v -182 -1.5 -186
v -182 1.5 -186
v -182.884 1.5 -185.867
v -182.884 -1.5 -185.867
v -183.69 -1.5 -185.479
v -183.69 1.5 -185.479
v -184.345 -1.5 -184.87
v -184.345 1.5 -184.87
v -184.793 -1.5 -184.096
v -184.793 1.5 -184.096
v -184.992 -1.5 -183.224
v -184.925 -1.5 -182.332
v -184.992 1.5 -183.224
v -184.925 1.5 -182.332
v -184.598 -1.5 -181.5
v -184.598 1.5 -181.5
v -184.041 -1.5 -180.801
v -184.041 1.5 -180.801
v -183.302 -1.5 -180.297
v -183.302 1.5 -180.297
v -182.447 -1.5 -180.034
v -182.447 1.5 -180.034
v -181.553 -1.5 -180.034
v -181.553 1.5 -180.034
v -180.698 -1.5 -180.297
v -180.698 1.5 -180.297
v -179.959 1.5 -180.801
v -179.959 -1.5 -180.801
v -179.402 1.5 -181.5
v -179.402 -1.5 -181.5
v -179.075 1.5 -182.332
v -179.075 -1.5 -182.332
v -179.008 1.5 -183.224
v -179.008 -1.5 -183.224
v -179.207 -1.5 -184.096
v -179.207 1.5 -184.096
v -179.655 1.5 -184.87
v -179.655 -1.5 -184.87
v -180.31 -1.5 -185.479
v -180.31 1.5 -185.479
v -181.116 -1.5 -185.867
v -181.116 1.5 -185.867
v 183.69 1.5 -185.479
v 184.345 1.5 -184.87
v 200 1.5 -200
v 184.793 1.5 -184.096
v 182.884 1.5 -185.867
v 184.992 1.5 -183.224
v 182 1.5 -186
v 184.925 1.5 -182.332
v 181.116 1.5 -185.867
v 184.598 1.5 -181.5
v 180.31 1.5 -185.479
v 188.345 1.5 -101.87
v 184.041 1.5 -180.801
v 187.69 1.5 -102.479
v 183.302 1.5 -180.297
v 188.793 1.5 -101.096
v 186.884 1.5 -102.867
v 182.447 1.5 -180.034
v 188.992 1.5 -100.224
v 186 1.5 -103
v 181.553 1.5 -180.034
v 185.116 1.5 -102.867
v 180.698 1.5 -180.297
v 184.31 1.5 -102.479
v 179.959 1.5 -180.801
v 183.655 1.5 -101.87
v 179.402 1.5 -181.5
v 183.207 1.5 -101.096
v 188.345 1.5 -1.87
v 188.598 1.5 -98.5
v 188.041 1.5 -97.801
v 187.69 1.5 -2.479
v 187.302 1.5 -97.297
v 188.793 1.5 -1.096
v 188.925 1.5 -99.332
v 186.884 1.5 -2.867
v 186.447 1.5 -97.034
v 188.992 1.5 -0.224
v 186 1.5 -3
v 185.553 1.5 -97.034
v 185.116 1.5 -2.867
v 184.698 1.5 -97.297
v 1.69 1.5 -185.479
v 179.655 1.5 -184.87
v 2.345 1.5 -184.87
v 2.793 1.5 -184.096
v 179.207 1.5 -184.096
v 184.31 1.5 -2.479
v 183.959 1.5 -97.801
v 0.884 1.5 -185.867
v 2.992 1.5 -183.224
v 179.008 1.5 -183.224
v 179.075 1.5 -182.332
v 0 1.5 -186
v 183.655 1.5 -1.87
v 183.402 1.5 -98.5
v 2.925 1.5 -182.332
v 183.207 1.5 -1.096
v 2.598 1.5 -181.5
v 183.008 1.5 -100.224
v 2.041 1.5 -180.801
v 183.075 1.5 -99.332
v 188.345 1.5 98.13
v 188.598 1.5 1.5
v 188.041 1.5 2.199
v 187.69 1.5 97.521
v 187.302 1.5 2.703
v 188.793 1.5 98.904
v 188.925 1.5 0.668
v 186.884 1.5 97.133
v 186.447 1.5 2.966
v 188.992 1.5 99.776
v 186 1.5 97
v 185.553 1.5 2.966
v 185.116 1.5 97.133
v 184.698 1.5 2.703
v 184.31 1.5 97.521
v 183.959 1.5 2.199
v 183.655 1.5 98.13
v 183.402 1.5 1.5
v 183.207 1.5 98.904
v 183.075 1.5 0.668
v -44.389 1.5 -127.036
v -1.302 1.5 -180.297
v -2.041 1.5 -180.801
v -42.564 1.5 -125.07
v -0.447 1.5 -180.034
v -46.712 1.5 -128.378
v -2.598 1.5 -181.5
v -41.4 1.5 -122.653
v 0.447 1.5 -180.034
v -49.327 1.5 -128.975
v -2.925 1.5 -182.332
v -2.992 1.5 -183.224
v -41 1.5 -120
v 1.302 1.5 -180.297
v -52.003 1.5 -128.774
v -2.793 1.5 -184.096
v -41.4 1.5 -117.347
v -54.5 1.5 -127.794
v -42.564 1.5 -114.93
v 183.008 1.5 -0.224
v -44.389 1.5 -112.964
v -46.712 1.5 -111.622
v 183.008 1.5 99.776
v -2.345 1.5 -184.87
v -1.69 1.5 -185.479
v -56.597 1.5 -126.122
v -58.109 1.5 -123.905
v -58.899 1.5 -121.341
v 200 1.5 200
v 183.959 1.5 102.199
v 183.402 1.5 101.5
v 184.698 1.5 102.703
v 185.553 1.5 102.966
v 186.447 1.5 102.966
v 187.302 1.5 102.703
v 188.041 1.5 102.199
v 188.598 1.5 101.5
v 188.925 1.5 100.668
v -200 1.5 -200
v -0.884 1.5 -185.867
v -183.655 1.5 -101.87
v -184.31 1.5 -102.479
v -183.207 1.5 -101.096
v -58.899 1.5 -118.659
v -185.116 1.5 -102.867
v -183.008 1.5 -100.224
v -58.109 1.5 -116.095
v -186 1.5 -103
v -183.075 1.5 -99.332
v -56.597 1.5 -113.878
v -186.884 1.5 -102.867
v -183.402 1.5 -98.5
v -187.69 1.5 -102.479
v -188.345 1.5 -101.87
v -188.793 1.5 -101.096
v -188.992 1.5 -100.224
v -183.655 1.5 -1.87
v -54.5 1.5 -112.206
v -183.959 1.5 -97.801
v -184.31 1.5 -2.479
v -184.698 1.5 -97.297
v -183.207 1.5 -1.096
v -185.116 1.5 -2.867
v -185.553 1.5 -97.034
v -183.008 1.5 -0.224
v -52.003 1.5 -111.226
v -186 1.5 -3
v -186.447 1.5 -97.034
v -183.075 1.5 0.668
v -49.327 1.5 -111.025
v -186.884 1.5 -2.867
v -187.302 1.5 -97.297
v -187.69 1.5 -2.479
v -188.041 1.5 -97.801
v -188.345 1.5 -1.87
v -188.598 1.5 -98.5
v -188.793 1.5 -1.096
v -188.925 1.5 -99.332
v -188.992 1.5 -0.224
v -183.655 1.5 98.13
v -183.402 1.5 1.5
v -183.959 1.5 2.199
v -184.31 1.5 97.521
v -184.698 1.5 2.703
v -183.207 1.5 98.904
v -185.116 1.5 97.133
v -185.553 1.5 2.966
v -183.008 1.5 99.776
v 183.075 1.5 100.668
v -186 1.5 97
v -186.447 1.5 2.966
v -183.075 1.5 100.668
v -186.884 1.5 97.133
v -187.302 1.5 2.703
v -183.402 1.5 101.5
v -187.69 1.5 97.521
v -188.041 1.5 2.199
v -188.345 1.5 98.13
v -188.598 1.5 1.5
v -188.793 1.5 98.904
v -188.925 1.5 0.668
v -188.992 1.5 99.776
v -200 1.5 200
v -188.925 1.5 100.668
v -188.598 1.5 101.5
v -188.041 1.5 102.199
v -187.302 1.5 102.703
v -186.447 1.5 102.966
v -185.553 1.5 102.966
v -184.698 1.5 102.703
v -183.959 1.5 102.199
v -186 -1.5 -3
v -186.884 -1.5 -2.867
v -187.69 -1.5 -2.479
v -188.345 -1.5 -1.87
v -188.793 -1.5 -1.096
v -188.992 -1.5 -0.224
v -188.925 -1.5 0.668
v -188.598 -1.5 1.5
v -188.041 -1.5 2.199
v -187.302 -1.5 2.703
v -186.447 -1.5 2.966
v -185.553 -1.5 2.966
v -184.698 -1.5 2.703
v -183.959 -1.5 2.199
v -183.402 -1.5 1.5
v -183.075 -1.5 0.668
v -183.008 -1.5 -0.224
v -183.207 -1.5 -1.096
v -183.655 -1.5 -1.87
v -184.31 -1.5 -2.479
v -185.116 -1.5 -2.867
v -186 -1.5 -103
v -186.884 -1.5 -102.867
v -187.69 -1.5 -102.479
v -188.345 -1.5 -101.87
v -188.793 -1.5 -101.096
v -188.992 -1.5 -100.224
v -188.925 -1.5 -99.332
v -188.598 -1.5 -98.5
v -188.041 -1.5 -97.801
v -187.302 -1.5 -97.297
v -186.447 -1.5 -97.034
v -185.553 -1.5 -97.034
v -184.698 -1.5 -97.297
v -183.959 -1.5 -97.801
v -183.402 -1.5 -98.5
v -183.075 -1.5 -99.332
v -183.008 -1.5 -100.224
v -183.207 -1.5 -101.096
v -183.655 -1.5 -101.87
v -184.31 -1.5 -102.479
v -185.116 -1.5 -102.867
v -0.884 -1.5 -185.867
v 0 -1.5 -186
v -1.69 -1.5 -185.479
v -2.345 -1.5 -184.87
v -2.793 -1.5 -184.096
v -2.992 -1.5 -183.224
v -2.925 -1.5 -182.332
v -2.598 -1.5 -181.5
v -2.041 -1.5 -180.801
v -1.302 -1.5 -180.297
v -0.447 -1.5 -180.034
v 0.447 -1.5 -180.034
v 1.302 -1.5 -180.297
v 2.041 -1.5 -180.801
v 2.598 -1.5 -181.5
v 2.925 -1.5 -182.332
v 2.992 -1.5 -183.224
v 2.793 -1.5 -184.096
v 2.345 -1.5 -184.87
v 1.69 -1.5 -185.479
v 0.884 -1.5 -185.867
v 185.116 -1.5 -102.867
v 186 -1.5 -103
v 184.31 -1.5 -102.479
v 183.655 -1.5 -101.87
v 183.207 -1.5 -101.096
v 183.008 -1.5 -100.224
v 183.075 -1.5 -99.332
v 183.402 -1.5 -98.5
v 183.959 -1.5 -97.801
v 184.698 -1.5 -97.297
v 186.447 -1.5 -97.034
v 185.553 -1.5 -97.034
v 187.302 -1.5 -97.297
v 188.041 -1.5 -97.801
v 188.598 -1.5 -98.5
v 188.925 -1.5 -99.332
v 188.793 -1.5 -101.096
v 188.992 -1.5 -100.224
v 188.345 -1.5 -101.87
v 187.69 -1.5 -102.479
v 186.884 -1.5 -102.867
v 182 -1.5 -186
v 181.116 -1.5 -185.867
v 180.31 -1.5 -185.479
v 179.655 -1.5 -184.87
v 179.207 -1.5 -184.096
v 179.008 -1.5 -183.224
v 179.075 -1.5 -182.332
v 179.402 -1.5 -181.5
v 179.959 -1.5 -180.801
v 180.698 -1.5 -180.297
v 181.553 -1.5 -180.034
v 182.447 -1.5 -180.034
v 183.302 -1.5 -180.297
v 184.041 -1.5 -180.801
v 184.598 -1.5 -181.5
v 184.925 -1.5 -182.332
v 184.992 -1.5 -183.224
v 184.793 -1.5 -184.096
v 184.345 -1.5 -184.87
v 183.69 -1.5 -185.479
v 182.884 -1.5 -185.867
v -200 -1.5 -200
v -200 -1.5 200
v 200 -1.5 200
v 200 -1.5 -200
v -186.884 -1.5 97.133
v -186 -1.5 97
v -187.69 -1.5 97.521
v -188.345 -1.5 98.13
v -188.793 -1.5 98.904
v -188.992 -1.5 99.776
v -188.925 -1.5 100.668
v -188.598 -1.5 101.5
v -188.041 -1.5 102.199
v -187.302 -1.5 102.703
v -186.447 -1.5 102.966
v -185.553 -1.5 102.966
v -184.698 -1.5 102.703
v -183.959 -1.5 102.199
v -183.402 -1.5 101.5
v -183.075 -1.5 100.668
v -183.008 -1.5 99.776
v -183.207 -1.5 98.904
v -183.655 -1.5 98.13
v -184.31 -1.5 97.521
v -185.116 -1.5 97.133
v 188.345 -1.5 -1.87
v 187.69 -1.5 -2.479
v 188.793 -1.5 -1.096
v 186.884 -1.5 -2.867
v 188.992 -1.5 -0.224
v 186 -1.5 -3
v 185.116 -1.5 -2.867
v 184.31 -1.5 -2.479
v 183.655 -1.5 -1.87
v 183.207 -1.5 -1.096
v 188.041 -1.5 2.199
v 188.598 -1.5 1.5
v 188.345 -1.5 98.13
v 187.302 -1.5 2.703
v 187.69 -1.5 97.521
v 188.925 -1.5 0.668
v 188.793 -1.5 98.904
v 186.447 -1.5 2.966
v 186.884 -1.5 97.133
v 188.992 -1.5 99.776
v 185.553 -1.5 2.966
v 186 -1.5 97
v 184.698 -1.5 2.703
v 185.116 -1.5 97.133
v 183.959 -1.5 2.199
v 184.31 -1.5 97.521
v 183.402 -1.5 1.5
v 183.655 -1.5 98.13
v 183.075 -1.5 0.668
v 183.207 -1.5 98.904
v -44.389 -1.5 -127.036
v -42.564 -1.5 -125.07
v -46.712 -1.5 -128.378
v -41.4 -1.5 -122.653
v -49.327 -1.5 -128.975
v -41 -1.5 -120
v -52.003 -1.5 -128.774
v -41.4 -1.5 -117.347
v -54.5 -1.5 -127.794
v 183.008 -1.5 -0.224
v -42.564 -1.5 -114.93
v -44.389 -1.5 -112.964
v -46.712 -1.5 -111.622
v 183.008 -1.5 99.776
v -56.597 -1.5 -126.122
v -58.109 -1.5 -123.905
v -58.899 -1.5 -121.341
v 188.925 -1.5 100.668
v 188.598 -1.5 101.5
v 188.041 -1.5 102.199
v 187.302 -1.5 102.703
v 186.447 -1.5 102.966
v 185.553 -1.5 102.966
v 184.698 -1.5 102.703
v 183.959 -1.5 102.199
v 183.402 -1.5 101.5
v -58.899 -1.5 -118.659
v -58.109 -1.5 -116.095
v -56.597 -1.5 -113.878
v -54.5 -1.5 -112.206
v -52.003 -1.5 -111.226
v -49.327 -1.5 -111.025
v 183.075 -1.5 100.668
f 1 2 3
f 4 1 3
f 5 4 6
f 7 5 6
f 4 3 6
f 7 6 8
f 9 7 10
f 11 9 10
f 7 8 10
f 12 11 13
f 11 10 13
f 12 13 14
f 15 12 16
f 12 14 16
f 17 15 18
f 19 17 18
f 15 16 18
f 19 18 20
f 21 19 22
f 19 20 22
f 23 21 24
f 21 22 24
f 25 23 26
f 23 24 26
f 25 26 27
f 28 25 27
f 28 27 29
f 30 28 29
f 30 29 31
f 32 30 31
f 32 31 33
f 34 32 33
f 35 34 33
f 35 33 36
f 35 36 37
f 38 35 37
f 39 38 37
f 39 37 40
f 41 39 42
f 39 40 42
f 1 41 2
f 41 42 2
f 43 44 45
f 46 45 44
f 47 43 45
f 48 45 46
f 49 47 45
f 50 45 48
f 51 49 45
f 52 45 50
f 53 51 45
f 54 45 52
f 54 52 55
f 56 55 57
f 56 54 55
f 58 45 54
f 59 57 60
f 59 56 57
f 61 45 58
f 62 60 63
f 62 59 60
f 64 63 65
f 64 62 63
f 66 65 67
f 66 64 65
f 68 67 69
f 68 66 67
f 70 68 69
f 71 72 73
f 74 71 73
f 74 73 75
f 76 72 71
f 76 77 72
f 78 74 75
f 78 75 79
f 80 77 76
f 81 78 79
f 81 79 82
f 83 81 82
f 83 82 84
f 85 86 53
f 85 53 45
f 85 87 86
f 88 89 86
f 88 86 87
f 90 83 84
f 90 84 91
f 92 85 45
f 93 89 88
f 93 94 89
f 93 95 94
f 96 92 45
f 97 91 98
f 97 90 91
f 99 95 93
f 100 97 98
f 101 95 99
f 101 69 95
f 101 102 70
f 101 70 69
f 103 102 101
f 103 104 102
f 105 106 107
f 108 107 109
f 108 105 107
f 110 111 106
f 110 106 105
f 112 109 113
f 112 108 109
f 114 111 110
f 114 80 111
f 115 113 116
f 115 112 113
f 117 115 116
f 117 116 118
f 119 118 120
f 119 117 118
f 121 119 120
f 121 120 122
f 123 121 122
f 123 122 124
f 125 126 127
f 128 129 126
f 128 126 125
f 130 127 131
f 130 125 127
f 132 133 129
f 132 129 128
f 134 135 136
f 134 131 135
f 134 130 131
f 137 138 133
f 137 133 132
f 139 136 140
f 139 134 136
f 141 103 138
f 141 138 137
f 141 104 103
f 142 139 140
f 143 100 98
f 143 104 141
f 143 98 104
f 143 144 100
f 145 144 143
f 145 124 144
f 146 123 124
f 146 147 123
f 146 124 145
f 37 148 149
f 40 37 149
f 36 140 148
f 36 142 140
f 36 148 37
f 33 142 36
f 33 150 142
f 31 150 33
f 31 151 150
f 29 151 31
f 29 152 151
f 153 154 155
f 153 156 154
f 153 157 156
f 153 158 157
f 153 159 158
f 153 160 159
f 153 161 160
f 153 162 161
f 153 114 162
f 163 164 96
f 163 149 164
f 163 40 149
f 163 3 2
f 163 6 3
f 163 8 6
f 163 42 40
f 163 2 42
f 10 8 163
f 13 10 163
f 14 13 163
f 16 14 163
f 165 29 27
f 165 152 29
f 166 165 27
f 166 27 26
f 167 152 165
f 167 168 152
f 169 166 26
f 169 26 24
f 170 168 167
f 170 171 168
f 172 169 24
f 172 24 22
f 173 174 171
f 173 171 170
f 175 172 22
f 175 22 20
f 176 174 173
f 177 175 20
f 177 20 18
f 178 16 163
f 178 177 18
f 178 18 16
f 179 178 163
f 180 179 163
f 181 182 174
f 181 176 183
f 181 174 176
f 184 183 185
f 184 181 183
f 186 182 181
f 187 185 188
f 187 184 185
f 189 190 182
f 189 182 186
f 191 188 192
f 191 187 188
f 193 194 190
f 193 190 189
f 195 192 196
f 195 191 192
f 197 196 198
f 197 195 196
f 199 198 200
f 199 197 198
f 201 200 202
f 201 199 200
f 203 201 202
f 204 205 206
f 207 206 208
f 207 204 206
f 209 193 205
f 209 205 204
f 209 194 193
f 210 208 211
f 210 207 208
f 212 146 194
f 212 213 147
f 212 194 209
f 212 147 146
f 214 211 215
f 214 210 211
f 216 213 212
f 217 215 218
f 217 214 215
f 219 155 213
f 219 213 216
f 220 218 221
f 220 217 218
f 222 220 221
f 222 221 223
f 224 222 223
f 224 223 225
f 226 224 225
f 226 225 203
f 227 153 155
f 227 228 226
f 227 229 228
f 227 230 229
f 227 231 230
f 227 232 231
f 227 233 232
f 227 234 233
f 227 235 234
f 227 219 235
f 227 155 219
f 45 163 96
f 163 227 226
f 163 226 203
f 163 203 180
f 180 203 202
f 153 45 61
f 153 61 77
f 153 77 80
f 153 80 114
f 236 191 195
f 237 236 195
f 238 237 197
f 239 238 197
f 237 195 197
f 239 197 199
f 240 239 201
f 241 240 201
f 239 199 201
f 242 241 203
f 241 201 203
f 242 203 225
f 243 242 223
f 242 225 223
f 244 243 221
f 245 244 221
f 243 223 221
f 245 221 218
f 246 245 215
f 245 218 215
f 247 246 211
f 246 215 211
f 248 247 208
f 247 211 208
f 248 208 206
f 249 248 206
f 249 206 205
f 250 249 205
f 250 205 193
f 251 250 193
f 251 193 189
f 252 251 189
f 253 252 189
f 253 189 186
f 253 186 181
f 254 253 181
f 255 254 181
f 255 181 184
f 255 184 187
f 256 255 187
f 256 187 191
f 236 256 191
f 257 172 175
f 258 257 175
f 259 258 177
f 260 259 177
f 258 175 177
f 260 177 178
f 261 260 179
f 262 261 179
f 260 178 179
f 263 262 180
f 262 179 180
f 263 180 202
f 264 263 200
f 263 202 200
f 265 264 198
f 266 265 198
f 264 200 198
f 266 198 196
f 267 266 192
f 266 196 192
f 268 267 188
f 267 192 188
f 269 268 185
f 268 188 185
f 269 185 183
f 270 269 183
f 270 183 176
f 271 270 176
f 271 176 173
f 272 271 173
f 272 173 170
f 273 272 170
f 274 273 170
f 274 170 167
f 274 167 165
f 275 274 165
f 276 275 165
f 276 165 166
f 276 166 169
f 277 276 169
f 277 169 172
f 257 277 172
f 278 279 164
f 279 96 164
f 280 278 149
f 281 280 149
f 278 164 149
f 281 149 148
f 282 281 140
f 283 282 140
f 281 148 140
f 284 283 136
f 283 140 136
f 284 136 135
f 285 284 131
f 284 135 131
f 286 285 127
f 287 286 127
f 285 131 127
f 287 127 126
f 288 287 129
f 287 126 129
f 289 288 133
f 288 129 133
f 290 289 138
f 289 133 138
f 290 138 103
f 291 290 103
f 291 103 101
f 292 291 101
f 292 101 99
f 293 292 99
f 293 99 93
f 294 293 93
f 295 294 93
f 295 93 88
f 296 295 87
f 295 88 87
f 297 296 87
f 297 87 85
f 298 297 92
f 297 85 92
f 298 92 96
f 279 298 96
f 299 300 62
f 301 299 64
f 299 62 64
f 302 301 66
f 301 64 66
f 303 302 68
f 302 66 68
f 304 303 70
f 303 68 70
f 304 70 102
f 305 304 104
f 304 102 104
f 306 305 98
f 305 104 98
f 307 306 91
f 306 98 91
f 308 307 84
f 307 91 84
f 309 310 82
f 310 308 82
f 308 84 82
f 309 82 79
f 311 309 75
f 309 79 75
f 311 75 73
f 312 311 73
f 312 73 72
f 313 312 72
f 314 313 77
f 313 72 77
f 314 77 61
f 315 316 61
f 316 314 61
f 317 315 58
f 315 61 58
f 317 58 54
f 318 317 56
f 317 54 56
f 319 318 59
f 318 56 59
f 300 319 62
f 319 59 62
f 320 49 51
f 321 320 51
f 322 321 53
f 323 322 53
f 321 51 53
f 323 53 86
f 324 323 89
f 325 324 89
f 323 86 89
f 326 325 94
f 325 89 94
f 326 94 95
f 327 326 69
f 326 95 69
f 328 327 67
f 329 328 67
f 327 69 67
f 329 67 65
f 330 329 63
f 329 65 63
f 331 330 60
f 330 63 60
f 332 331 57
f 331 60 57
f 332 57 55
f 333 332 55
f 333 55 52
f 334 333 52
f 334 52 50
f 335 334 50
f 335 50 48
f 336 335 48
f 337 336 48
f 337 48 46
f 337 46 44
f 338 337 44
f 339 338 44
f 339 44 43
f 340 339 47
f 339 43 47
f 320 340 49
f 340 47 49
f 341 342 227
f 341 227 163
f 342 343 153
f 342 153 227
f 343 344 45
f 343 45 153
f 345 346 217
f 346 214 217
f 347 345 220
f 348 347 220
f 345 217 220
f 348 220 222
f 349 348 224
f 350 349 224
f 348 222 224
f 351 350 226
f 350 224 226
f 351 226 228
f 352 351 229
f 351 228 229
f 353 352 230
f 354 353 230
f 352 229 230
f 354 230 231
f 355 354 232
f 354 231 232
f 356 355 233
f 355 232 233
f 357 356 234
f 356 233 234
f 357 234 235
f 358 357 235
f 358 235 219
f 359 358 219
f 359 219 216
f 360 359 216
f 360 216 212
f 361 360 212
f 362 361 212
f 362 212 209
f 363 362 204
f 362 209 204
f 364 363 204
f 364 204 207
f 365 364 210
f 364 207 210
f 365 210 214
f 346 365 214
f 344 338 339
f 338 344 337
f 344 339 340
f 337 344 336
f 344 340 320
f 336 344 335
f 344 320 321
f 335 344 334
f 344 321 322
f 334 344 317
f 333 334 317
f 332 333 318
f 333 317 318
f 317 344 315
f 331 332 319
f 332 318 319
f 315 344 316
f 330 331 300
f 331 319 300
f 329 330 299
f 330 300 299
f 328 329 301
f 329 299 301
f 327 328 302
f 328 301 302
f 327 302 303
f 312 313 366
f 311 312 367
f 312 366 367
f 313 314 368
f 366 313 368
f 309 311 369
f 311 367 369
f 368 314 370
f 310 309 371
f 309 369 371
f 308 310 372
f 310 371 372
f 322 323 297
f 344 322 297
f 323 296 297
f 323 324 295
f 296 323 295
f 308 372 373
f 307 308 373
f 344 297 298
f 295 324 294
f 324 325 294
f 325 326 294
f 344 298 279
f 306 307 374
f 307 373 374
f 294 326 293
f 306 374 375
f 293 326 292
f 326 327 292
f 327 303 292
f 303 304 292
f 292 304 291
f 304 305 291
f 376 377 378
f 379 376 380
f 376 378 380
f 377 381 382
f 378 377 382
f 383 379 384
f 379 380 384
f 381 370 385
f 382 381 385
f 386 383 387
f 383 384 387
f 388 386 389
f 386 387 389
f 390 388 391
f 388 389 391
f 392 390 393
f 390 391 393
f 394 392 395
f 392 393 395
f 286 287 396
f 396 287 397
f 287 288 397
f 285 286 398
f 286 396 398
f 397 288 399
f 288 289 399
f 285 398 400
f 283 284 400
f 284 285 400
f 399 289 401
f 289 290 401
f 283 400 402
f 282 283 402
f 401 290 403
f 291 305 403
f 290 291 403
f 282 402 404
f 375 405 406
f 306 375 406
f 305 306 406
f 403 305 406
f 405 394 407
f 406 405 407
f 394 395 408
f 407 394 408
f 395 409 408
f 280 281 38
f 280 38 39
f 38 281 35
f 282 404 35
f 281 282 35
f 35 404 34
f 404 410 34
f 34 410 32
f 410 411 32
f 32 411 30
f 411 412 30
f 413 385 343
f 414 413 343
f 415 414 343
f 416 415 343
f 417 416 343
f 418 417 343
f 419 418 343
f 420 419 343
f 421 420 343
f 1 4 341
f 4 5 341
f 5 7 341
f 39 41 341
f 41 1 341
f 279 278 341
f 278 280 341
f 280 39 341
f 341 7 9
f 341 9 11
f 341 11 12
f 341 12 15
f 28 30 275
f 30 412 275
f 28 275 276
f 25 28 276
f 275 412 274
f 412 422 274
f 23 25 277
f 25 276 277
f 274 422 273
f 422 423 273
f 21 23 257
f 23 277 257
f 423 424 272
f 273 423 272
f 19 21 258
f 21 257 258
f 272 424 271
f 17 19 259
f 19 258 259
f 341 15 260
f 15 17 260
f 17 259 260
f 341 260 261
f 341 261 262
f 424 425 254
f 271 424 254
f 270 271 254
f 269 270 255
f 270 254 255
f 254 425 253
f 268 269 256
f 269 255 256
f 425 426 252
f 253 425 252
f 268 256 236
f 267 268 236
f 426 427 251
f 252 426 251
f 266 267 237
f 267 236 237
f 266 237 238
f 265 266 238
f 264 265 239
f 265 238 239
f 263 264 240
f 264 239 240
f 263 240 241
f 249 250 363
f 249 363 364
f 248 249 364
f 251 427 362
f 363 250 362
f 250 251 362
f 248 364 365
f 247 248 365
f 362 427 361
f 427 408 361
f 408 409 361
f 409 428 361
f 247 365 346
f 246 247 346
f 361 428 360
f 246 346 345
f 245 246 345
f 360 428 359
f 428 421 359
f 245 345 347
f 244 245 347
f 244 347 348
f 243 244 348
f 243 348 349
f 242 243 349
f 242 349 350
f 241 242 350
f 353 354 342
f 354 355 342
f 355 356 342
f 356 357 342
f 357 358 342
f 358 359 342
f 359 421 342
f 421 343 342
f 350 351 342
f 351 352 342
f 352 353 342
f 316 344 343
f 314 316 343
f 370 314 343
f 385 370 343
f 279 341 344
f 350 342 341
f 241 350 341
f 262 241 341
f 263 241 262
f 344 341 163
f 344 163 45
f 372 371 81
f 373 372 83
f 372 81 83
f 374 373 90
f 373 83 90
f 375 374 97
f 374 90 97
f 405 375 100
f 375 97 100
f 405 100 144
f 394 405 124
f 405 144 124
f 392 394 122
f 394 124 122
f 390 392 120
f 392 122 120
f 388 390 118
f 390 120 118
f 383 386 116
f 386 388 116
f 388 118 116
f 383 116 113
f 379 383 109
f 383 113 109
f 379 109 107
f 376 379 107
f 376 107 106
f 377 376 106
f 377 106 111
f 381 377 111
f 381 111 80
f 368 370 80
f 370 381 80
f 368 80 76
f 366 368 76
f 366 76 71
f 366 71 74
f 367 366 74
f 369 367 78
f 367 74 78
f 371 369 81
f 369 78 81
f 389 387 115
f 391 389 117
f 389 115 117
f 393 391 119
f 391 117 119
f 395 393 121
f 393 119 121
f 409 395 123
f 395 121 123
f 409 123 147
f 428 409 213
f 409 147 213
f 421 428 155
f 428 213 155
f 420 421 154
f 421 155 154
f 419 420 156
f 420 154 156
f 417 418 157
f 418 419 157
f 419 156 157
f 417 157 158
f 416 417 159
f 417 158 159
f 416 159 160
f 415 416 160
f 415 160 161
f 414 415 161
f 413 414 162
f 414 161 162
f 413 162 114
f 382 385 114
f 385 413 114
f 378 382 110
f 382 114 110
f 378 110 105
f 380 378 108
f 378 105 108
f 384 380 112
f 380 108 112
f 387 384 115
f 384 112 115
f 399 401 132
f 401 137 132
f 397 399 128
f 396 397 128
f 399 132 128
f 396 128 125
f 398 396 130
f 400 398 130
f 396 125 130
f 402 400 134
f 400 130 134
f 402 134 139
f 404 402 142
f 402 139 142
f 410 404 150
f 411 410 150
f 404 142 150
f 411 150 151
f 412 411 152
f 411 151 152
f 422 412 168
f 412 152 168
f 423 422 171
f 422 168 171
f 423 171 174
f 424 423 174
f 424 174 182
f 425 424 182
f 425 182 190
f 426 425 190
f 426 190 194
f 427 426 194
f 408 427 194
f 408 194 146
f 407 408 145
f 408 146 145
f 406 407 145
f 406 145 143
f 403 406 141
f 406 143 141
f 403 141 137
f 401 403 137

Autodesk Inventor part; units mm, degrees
ref_plane "YZ Plane" through (0, 0, 0) normal (1, 0, 0) x (0, 1, 0)
ref_plane "XZ Plane" through (0, 0, 0) normal (0, 1, 0) x (-1, 0, 0)
ref_plane "XY Plane" through (0, 0, 0) normal (0, 0, 1) x (1, 0, 0)
sketch "Sketch1" plane through (0, 0, 0) normal (0, 1, 0) x (-1, 0, 0)
  line L0 (-200, 200) -> (200, 200)
  line L1 (200, 200) -> (200, -200)
  line L2 (200, -200) -> (-200, -200)
  line L3 (-200, -200) -> (-200, 200)
  line L4 (-200, 200) -> (200, -200) construction
  line L5 (200, 200) -> (-200, -200) construction
  point P0 (0, 0)
  dimension "d0" = 400
extrude "Extrusion1" add sketch "Sketch1" along normal mid plane 3
sketch "Sketch2" plane through (0, -1.5, 0) normal (0, -1, 0) x (1, 0, 0)
  line L0 (-200, -200) -> (200, -200) projected
  point P0 (0, 0)
  point P1 (-182, -183)
  point P2 (0, -183)
  point P3 (182, -183)
  dimension "d3" = 182
  dimension "d4" = 182
  dimension "d5" = 17
hole "Hole1" at (-182, -1.5, -183) at (0, -1.5, -183) at (182, -1.5, -183) direction (0, 1, 0) diameter 6 depth 14.2 tip angle 118
sketch "Sketch3" plane through (0, -1.5, 0) normal (0, -1, 0) x (1, 0, 0)
  line L0 (200, 200) -> (-200, 200) projected
  line L1 (-200, 200) -> (-200, -200) projected
  point P0 (0, 0)
  point P1 (-186, 100)
  point P2 (-186, 0)
  point P3 (-186, -100)
  dimension "d13" = 100
  dimension "d14" = 100
  dimension "d15" = 100
  dimension "d16" = 14
hole "Hole2" at (-186, -1.5, 100) at (-186, -1.5, 0) at (-186, -1.5, -100) direction (0, 1, 0) diameter 6 depth 14.2 tip angle 118
mirror "Mirror1" about plane through (0, 0, 0) normal (1, 0, 0) of "Hole2"
sketch "Sketch4" plane through (0, 1.5, 0) normal (0, 1, 0) x (1, 0, 0)
  circle A0 centre (-50, 120) radius 9
  line L0 (200, 200) -> (-200, 200) projected
  line L1 (-200, 200) -> (-200, -200) projected
  point P0 (0, 0)
  dimension "d24" = 80
  dimension "d25" = 18
  dimension "d26" = 150
extrude "Extrusion2" cut sketch "Sketch4" against normal blind 10
equation "\"d4\" = d3"
equation "\"d14\" = d13"
equation "\"d15\" = d14"
properties part number "HCMUTE-CDT23-KXL_A02" material "PMMA Plastic"
